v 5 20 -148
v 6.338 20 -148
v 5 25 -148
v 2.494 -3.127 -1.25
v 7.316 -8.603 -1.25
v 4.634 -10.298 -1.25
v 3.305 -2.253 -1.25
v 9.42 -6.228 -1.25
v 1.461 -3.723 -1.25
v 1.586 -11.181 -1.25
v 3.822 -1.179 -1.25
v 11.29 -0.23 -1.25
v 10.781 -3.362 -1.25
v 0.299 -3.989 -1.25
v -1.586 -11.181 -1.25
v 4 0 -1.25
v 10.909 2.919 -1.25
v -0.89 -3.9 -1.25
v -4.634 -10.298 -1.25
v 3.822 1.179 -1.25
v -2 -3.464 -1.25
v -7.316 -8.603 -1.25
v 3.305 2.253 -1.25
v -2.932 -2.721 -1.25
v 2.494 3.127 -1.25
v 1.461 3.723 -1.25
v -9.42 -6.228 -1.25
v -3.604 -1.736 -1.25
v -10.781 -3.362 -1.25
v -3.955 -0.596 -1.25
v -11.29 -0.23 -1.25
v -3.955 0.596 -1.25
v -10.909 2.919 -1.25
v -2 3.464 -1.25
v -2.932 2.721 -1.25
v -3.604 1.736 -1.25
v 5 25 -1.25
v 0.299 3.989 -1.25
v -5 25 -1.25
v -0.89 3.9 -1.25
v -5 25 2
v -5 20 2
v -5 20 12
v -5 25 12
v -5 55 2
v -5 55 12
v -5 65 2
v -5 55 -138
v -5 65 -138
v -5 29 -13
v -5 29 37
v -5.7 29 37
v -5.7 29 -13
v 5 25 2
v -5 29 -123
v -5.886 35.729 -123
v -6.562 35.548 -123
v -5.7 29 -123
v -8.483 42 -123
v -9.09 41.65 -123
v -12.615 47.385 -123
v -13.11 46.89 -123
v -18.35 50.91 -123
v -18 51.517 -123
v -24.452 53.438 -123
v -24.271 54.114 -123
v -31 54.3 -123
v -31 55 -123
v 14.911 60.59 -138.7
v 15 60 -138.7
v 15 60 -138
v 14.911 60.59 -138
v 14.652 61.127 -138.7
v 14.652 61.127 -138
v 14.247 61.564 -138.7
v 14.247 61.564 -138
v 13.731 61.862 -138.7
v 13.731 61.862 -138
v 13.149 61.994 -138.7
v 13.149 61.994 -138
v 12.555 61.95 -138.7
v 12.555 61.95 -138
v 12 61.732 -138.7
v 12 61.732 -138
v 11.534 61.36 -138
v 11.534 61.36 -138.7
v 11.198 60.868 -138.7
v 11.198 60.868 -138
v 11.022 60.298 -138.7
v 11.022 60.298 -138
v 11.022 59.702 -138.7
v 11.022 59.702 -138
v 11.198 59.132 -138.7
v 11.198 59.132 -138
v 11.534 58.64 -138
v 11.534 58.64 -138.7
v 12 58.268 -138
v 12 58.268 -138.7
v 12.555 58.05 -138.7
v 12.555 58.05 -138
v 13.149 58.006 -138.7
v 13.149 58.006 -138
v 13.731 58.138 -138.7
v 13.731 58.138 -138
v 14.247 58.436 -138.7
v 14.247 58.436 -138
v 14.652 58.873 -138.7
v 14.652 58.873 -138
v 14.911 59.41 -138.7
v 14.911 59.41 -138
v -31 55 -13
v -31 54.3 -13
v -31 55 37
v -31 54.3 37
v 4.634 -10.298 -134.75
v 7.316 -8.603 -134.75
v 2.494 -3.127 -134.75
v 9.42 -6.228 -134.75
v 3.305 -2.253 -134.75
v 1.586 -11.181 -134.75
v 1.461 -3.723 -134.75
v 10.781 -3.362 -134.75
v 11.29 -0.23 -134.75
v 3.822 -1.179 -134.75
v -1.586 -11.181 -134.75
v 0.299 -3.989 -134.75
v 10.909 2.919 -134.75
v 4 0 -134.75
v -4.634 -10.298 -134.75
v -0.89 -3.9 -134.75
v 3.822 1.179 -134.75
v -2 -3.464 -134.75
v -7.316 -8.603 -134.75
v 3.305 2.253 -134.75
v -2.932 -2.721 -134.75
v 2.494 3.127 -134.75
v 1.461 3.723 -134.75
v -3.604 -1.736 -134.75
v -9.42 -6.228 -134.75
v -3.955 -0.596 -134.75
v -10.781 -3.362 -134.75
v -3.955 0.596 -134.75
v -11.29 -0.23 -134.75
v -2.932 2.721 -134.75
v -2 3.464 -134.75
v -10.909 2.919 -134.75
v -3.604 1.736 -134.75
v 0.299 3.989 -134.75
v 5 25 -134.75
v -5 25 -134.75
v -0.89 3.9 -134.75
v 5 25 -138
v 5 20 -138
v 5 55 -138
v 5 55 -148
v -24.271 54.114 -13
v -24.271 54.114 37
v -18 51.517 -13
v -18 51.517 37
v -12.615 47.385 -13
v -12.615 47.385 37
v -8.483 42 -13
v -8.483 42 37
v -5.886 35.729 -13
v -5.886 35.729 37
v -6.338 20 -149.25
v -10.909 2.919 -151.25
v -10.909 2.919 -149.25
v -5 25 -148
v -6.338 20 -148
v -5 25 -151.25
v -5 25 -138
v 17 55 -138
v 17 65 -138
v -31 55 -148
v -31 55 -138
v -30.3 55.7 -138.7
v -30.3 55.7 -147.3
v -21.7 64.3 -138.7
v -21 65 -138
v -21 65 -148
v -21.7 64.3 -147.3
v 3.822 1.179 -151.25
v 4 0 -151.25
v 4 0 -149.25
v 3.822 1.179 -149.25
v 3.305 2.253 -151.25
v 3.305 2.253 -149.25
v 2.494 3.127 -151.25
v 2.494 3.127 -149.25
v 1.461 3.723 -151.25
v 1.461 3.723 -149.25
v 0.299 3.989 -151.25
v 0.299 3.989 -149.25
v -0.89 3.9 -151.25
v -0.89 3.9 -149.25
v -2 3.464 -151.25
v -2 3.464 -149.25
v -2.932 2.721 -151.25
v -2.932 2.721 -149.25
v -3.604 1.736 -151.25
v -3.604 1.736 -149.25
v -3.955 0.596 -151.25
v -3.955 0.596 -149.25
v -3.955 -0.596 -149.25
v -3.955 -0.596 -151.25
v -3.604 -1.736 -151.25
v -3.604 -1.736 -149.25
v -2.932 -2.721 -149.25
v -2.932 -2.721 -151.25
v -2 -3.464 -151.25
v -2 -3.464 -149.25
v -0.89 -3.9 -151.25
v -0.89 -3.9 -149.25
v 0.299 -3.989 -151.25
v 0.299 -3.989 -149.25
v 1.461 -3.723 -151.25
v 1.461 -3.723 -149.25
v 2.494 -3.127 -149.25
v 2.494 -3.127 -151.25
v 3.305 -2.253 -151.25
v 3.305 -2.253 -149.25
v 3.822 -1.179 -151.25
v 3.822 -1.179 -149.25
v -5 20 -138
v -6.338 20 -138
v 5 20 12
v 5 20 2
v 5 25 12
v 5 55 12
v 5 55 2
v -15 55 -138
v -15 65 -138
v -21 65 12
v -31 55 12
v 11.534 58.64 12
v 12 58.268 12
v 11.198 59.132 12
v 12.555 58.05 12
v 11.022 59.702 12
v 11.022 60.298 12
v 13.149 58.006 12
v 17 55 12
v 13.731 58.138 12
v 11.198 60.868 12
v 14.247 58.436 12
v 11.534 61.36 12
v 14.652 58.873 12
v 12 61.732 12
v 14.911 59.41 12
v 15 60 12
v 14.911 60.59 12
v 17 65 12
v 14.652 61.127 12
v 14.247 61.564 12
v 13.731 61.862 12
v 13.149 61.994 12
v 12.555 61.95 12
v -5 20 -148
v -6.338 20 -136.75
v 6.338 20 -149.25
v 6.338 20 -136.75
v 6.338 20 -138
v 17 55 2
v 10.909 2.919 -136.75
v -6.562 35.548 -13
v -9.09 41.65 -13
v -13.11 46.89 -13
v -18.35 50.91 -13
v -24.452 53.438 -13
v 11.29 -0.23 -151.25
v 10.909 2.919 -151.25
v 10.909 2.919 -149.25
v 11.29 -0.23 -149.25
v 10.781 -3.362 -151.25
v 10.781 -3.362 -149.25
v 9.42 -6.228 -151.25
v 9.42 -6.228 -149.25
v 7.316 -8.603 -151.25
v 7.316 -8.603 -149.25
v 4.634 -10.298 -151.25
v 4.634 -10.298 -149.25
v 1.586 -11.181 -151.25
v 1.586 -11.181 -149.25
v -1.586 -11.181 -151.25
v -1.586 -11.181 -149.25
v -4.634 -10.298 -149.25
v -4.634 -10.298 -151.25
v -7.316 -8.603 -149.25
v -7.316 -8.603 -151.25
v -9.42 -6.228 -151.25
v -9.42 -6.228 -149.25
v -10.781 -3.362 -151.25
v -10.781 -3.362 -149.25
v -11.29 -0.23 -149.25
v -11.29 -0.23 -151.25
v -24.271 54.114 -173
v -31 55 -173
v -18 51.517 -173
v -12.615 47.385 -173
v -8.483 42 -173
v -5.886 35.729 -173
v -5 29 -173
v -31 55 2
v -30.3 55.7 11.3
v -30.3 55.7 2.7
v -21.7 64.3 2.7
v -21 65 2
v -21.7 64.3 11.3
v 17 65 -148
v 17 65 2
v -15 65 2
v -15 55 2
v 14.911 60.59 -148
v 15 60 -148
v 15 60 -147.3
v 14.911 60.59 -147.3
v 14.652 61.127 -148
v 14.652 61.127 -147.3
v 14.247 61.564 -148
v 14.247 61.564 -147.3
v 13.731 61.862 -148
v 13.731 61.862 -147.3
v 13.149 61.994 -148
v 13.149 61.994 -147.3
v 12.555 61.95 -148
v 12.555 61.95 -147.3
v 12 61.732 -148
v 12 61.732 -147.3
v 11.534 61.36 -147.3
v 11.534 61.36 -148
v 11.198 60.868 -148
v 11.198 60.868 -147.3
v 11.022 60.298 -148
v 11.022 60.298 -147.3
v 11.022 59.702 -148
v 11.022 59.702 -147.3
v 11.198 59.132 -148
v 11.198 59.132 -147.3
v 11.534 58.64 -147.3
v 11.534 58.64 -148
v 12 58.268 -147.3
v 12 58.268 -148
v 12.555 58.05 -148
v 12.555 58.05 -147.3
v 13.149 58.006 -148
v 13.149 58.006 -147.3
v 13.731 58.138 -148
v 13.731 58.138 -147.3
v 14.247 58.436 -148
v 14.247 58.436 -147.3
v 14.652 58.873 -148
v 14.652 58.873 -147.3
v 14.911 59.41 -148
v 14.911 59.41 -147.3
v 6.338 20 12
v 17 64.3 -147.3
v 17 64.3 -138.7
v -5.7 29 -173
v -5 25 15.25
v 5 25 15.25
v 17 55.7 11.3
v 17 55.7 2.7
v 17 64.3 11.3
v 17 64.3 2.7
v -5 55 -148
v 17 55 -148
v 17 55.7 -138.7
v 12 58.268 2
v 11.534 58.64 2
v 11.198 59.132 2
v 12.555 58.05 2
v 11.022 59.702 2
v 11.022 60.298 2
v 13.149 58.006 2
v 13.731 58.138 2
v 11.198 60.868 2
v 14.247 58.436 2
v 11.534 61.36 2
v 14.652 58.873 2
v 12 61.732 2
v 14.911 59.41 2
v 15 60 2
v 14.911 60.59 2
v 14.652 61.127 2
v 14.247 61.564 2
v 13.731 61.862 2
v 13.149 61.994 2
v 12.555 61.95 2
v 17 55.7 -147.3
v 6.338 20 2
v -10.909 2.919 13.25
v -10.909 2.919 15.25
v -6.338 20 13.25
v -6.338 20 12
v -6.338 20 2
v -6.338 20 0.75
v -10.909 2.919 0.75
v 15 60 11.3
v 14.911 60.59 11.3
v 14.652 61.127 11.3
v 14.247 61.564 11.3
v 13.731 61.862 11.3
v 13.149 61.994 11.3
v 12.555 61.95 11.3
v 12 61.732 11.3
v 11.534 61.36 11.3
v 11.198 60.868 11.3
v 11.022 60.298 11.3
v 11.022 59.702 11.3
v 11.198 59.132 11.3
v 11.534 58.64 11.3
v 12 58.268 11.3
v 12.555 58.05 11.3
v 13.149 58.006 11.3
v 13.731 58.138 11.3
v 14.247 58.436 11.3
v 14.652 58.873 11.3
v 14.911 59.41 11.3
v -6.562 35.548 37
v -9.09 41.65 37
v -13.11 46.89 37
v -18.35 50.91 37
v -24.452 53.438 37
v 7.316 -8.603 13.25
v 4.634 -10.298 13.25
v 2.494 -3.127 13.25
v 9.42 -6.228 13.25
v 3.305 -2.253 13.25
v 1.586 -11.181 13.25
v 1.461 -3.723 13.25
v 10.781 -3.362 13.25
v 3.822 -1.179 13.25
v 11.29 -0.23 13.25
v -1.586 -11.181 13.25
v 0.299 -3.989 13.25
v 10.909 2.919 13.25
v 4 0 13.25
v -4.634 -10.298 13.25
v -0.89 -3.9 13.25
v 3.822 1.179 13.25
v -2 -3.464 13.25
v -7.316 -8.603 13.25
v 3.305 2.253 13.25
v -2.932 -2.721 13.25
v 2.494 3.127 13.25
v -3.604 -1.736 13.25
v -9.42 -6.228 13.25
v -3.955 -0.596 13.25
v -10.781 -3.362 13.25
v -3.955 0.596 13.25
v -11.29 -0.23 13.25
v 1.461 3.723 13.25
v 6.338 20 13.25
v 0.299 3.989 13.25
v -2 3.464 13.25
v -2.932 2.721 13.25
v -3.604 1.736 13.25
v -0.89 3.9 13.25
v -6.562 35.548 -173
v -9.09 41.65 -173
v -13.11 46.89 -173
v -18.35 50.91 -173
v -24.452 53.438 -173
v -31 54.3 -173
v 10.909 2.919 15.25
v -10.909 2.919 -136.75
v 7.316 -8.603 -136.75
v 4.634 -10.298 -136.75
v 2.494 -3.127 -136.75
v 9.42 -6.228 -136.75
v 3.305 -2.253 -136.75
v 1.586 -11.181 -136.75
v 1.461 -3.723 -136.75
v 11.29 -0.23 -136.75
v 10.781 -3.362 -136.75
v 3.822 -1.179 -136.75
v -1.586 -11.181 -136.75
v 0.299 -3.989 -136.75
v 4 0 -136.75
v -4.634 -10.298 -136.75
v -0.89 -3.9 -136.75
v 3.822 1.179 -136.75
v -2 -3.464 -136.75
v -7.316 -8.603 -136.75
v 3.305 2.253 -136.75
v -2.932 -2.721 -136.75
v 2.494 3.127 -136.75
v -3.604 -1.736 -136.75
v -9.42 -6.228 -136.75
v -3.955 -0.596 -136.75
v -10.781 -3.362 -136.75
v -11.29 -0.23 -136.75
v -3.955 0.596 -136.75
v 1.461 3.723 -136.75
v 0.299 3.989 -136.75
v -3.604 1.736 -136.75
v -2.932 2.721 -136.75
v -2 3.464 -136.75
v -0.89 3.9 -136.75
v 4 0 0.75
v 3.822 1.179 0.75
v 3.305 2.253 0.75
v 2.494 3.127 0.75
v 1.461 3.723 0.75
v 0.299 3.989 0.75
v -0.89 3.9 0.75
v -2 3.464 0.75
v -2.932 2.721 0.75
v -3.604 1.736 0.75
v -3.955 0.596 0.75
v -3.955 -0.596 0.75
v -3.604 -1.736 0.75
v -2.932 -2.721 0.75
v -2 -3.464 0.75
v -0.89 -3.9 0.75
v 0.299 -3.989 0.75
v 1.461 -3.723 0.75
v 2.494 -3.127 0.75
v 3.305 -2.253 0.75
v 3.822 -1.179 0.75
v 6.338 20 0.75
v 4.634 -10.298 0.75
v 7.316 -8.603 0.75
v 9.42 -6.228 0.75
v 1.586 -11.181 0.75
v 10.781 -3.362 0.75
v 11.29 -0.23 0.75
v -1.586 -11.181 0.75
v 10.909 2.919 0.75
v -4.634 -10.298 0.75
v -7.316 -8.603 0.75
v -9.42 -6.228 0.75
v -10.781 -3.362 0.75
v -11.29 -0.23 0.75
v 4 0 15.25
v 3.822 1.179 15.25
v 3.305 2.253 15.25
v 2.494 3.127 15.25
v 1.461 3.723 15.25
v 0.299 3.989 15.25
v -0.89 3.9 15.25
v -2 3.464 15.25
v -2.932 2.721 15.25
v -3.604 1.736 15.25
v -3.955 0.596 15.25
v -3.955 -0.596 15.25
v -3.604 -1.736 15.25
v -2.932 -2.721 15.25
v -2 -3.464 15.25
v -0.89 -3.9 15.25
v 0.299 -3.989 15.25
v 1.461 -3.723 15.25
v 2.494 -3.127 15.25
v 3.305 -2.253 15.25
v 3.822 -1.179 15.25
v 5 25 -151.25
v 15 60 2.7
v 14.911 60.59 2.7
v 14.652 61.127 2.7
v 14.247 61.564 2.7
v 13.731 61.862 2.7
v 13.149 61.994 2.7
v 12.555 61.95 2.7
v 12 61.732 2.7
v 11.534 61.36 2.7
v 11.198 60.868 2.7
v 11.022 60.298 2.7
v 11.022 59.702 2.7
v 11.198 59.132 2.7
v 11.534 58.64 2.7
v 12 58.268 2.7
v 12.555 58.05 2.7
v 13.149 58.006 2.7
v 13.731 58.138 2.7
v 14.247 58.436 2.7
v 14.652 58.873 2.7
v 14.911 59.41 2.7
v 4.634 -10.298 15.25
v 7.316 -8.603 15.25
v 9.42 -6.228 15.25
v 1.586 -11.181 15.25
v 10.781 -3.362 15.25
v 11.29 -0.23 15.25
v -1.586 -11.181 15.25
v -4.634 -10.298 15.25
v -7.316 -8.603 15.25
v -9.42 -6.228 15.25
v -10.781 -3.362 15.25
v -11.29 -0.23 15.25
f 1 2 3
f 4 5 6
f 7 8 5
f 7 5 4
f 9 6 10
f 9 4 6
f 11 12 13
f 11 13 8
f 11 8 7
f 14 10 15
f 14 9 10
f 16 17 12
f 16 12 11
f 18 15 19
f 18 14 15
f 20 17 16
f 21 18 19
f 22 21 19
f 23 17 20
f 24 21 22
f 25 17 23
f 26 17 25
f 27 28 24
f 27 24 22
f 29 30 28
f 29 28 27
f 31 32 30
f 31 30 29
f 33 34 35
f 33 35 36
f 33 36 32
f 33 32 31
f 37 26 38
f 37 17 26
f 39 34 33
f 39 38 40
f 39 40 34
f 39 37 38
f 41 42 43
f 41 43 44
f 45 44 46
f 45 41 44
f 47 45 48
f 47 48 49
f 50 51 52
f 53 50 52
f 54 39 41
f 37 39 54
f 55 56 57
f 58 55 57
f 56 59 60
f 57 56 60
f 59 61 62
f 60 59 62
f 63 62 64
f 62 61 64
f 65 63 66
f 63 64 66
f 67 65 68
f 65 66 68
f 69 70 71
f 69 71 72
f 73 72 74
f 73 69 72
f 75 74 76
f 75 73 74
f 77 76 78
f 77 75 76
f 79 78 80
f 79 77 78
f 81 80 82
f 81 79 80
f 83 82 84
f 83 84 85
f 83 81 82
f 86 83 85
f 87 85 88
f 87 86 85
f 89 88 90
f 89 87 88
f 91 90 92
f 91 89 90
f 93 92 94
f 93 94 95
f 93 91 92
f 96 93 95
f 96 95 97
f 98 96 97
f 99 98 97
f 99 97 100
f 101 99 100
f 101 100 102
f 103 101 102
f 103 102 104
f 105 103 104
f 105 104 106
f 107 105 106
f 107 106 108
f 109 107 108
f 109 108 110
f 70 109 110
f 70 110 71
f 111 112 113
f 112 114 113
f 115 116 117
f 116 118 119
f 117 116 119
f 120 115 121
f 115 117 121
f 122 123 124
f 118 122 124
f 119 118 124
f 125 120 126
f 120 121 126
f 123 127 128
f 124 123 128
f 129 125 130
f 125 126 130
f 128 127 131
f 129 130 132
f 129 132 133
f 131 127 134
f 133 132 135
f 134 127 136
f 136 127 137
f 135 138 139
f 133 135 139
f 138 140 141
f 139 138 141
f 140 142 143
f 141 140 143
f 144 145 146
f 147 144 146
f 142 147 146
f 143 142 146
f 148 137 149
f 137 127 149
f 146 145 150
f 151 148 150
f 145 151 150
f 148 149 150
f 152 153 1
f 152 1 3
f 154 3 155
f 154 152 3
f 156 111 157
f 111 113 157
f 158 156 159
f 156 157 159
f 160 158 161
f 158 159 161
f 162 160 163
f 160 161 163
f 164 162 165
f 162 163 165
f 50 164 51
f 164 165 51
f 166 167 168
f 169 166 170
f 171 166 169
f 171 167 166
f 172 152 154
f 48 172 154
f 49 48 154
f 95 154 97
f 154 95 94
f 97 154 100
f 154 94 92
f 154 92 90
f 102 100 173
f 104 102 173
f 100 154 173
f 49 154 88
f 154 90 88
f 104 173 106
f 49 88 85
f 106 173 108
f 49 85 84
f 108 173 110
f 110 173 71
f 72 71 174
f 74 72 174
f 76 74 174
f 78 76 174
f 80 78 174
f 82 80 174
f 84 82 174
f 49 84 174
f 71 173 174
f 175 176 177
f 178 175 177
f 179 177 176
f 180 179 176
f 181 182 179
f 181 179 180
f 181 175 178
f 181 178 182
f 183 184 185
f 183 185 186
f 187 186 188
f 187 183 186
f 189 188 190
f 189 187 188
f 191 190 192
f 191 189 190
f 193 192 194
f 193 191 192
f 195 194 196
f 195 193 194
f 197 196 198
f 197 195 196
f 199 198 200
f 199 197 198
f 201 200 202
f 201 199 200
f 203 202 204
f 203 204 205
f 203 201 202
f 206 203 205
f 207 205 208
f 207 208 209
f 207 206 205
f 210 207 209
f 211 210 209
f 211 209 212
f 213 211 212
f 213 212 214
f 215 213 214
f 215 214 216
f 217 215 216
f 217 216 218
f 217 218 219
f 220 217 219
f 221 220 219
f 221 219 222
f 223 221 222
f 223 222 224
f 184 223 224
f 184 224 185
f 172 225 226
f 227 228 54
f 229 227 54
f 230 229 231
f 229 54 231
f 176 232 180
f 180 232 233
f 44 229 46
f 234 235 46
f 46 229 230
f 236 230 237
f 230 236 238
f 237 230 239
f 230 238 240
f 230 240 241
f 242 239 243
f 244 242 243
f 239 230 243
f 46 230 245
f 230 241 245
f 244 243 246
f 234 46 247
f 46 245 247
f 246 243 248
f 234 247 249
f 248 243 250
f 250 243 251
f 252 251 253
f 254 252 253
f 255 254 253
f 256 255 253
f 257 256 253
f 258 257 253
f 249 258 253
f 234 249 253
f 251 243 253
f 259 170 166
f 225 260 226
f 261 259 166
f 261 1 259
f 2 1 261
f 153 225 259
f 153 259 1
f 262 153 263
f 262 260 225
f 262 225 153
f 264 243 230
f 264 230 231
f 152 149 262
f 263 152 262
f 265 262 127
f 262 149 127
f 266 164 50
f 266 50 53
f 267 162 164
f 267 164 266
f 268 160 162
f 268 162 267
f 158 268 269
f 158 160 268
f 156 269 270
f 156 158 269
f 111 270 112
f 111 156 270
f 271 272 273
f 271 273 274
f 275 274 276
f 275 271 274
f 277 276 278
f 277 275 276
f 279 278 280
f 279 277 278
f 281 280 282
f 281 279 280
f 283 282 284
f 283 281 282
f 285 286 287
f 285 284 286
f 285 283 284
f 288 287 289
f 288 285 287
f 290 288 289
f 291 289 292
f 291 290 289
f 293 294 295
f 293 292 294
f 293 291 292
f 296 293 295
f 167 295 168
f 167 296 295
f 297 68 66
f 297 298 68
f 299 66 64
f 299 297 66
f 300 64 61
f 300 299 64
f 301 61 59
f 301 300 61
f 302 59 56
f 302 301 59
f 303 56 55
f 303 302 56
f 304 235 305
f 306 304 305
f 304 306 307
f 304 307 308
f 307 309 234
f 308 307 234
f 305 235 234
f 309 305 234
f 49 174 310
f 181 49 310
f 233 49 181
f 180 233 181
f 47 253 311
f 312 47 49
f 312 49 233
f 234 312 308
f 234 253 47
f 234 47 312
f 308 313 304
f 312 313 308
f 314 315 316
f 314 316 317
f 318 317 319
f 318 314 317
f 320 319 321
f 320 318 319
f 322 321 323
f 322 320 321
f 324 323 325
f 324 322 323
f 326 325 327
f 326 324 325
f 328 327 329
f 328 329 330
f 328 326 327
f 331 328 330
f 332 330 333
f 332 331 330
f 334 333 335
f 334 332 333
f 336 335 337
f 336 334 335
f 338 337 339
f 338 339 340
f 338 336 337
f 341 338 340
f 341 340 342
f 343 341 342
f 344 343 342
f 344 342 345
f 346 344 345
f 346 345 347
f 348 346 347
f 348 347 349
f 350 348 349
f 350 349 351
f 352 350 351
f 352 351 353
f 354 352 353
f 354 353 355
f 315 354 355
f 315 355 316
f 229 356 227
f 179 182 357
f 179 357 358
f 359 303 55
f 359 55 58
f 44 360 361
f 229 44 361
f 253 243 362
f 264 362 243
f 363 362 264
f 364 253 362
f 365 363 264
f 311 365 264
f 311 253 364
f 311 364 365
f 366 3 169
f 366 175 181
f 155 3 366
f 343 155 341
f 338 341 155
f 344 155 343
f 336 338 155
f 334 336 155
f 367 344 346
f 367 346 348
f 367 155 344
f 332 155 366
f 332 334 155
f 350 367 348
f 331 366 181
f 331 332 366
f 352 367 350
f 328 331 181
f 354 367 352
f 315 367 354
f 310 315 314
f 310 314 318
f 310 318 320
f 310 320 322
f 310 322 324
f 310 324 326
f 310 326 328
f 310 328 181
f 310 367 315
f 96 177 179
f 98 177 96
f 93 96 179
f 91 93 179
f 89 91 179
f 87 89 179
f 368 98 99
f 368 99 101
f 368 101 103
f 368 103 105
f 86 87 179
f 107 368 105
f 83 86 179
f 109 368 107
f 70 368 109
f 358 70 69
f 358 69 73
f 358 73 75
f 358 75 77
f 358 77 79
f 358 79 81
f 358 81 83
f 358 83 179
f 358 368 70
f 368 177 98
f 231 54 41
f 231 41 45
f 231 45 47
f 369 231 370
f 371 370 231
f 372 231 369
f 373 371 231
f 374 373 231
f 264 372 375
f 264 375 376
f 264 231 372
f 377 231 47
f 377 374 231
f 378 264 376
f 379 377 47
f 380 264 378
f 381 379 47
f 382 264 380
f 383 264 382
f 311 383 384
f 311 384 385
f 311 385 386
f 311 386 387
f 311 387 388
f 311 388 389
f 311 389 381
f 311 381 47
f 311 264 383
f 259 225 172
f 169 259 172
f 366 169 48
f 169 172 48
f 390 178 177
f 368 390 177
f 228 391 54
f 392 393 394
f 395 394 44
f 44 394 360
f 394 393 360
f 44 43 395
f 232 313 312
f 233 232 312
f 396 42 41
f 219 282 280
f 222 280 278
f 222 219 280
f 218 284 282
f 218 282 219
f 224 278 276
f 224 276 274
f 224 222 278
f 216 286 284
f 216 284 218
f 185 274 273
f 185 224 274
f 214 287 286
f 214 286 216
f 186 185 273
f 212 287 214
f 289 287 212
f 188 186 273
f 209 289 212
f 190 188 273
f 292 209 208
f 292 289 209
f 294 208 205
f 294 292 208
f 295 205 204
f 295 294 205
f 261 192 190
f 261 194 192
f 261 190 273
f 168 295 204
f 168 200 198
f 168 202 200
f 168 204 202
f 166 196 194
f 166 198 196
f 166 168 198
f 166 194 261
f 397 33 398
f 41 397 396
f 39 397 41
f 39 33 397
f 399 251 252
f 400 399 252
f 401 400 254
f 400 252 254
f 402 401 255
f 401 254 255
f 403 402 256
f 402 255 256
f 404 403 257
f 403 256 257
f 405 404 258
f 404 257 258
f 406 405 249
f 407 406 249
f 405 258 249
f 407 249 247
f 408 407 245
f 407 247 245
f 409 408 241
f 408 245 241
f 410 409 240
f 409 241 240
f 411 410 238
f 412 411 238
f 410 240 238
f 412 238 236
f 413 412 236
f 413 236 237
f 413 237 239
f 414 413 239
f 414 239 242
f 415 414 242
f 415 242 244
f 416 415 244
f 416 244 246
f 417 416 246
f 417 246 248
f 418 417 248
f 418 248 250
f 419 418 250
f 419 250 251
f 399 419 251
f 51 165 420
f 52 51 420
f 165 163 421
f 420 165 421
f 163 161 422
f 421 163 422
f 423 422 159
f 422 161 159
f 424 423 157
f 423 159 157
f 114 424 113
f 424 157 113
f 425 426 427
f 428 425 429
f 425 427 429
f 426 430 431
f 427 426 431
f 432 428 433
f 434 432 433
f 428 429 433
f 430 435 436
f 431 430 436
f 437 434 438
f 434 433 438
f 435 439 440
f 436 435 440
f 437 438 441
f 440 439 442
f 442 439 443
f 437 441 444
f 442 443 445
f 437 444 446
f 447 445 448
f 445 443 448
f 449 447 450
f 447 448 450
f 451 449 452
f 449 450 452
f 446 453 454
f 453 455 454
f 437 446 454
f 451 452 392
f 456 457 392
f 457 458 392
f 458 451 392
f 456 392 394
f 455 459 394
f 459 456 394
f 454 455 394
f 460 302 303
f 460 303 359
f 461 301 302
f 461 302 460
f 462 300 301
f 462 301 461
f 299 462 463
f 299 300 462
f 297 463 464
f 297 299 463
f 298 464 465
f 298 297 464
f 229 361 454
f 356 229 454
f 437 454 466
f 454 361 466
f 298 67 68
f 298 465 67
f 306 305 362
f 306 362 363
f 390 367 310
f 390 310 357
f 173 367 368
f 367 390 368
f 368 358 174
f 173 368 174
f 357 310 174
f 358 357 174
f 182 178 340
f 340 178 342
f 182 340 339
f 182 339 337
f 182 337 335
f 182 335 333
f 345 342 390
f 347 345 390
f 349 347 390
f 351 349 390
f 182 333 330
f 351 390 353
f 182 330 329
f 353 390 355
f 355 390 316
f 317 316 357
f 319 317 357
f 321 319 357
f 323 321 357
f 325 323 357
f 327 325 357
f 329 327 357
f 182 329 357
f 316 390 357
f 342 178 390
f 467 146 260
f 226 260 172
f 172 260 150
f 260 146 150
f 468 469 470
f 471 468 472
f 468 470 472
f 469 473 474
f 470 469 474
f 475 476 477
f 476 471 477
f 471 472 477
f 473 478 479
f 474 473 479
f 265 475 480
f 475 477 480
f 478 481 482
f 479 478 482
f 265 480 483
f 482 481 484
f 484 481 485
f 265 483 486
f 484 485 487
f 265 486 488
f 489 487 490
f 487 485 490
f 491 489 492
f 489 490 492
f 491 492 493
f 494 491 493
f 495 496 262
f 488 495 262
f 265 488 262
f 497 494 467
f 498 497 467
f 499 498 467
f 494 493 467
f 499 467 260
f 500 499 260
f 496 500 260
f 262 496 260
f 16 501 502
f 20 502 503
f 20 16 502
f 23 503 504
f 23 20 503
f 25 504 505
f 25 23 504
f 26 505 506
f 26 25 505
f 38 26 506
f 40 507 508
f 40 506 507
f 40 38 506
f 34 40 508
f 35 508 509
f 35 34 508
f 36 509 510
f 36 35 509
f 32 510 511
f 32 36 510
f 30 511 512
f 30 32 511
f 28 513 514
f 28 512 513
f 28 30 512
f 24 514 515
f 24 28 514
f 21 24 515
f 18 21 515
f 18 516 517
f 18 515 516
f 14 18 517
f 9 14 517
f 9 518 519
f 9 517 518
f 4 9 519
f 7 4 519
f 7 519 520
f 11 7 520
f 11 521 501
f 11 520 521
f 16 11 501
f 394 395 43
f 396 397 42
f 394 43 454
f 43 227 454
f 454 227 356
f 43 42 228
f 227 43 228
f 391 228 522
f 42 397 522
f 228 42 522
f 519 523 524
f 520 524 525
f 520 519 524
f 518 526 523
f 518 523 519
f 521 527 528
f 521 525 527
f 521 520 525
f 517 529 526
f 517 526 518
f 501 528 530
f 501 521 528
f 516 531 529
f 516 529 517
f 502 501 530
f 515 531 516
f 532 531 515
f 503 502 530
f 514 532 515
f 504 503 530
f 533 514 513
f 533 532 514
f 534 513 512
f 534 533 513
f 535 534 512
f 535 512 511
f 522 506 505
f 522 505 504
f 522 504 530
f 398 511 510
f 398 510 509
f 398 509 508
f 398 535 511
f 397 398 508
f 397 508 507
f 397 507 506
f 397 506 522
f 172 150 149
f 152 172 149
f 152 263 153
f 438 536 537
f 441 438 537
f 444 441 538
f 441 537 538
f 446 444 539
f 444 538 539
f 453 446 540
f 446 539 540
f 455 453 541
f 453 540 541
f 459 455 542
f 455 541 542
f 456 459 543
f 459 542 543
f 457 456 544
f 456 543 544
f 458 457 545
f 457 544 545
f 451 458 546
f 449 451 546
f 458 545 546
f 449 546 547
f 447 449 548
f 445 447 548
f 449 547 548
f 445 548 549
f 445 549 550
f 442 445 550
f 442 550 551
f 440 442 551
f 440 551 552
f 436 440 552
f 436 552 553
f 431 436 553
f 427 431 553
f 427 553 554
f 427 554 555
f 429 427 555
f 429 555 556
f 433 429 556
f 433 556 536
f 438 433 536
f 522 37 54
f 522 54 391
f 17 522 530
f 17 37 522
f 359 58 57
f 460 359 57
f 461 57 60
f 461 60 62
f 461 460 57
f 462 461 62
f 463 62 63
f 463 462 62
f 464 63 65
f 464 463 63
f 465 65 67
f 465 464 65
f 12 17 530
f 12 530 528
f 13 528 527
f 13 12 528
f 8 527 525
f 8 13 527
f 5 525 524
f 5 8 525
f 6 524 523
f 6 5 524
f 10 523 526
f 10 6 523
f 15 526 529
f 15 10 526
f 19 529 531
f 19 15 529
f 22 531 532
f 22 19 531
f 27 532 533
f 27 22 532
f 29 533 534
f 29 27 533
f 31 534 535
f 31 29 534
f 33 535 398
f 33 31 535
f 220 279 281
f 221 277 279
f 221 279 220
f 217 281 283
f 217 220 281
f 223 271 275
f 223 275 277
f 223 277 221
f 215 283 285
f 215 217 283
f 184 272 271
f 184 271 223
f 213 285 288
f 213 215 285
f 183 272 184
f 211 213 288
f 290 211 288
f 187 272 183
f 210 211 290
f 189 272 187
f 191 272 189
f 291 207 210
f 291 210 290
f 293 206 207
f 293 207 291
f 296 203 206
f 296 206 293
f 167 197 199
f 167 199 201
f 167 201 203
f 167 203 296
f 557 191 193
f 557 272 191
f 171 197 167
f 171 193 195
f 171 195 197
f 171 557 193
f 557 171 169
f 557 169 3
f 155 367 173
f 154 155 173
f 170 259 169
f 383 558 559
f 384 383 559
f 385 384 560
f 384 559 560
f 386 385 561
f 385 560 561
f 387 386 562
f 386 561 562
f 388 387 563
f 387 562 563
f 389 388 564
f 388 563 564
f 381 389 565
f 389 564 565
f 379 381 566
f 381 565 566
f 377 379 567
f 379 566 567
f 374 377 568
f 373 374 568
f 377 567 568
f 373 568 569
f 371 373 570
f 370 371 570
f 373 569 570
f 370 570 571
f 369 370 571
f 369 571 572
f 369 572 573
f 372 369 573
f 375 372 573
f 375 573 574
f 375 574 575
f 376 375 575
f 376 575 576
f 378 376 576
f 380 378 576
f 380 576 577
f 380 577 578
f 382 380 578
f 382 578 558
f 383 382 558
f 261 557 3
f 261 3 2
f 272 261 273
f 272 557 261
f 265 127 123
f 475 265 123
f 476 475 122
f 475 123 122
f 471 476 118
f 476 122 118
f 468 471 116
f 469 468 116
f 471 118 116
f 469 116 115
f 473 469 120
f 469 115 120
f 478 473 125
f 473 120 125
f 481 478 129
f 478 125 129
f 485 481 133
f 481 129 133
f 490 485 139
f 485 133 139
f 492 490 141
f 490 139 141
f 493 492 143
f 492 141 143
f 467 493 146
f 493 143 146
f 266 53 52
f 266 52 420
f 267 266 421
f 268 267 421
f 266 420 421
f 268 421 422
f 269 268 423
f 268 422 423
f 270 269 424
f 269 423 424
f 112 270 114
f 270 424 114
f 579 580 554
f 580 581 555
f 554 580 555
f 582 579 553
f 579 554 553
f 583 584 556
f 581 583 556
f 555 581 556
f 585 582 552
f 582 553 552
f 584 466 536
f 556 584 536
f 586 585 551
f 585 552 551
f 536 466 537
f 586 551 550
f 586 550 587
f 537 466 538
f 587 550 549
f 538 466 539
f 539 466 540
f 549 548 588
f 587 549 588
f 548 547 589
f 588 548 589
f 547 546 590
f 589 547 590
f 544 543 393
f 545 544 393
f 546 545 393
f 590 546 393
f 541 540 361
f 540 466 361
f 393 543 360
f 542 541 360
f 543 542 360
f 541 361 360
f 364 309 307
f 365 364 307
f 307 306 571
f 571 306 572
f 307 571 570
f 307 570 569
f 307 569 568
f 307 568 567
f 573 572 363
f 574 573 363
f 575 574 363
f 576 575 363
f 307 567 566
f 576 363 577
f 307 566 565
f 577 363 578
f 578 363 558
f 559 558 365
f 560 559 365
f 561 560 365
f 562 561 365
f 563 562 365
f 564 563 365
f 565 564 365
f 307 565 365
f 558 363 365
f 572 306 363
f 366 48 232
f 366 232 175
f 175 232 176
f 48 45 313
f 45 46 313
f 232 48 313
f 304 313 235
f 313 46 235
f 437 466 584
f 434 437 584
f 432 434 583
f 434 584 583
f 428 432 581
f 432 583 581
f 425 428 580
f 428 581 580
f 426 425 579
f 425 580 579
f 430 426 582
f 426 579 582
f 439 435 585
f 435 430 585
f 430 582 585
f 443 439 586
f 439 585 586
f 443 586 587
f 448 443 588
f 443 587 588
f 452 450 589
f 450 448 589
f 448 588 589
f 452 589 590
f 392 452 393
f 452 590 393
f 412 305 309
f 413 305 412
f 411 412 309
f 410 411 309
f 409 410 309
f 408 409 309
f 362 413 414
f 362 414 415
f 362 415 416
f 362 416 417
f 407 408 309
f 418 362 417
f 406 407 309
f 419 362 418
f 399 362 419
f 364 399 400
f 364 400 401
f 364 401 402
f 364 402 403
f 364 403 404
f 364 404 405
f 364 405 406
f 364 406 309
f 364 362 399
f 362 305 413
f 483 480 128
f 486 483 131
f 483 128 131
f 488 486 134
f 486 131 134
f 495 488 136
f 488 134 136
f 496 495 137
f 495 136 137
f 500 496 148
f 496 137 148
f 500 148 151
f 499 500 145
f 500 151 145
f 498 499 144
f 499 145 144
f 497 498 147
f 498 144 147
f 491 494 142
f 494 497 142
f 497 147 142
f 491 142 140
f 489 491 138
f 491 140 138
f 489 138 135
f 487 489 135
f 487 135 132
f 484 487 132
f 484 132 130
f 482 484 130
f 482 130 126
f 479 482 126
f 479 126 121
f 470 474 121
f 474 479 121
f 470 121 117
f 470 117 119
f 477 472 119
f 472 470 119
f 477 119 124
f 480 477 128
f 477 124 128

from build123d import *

# Parameters (mm, degrees)
BOSS_EXTRUDE1_DEPTH      = 2
BOSS_EXTRUDE1_DEPTH_BACK = 1.25
SKETCH1_R                = 4
SKETCH2_W                = 10
SKETCH2_H                = 35
BOSS_EXTRUDE2_DEPTH      = 10
SKETCH4_W                = 10
SKETCH4_H                = 10
SKETCH4_W_2              = 8.6
SKETCH4_H_2              = 8.6
BOSS_EXTRUDE3_DEPTH      = 48
SKETCH5_R                = 2
CUT_EXTRUDE1_DEPTH       = 50
BOSS_EXTRUDE4_DEPTH      = 25
CUT_EXTRUDE2_DEPTH       = 50
CUT_EXTRUDE3_DEPTH       = 31
CUT_EXTRUDE3_DEPTH_BACK  = 26
SKETCH14_W               = 1.25
SKETCH14_H               = 34.903307858
SKETCH14_H_2             = 36.088768165
SKETCH15_W               = 10
SKETCH15_H               = 10
BOSS_EXTRUDE7_DEPTH      = 140


with BuildPart() as part:
    # Sketch1 → Boss-Extrude1 (new, two sides: drawn at the far end of the back side and taken through both)
    with BuildSketch(Plane.XY.offset(-BOSS_EXTRUDE1_DEPTH_BACK)):
        with BuildLine():
            Line((-5, 25), (5, 25))
            Line((5, 25), (10.908860009, 2.919234199))
            ThreePointArc((10.908860009, 2.919234199), (0, -11.292703618), (-10.908860009, 2.919234199))
            Line((-10.908860009, 2.919234199), (-5, 25))
        make_face()
        Circle(SKETCH1_R, mode=Mode.SUBTRACT)
    extrude(amount=BOSS_EXTRUDE1_DEPTH + BOSS_EXTRUDE1_DEPTH_BACK)

    # Sketch2 → Boss-Extrude2 (add)
    with BuildSketch(Plane.XY.offset(2)):
        with Locations((0, 37.5)):
            Rectangle(SKETCH2_W, SKETCH2_H)
    extrude(amount=BOSS_EXTRUDE2_DEPTH)

    # Mirror1: part across plane


with BuildPart() as part_1:
    add(part.part)
    add(part.part.mirror(Plane.XY.offset(7)))

    # Sketch4 → Boss-Extrude3 (add)
    with BuildSketch(Plane(origin=(17, 0, 0), x_dir=(0, 0, -1), z_dir=(1, 0, 0))):
        with Locations((-7, 60)):
            Rectangle(SKETCH4_W, SKETCH4_H)
        with Locations((-7, 60)):
            Rectangle(SKETCH4_W_2, SKETCH4_H_2, mode=Mode.SUBTRACT)
    extrude(amount=-BOSS_EXTRUDE3_DEPTH)

    # Sketch5 → Cut-Extrude1 (cut)
    with BuildSketch(Plane.XY.offset(12)):
        with Locations((13, 60)):
            Circle(SKETCH5_R)
    extrude(amount=-CUT_EXTRUDE1_DEPTH, mode=Mode.SUBTRACT)

    # Sketch10 → Cut-Extrude2 (cut)
    with BuildSketch(Plane.XY.offset(12)):
        Polygon((-31, 65), (-31, 55), (-21, 65), align=None)
    extrude(amount=-CUT_EXTRUDE2_DEPTH, mode=Mode.SUBTRACT)

    # Sketch14 → Cut-Extrude3 (cut, two sides: drawn at the far end of the back side and taken through both)
    with BuildSketch(Plane(origin=(5, 0, 0), x_dir=(0, 0, -1), z_dir=(1, 0, 0)).offset(-CUT_EXTRUDE3_DEPTH_BACK)):
        with Locations((-1.375, 2.548346071)):
            Rectangle(SKETCH14_W, SKETCH14_H)
        with Locations((-12.625, 1.955615917)):
            Rectangle(SKETCH14_W, SKETCH14_H_2)
    extrude(amount=CUT_EXTRUDE3_DEPTH + CUT_EXTRUDE3_DEPTH_BACK, mode=Mode.SUBTRACT)


with BuildPart() as body_2:
    # Sketch9 → Boss-Extrude4 (new, symmetric)
    with BuildSketch(Plane.XY.offset(12)):
        with BuildLine():
            ThreePointArc((-5.7, 29), (-13.110198436, 46.889801564), (-31, 54.3))
            Line((-31, 54.3), (-31, 55))
            ThreePointArc((-31, 55), (-12.615223689, 47.384776311), (-5, 29))
            Line((-5, 29), (-5.7, 29))
        make_face()
    extrude(amount=BOSS_EXTRUDE4_DEPTH, both=True)


with BuildPart() as body_3:
    # Mirror2: mirrored copy
    add(part_1.part.mirror(Plane(origin=(0, 0, -68), x_dir=(1, 0, 0), z_dir=(0, 0, -1))))


with BuildPart() as body_4:
    # Mirror2 2: mirrored copy
    add(body_2.part.mirror(Plane(origin=(0, 0, -68), x_dir=(1, 0, 0), z_dir=(0, 0, -1))))


with BuildPart() as part_2:
    add(part_1.part)

    add(body_3.part)  # Boss-Extrude7 merges body 3
    # Sketch15 → Boss-Extrude7 (add)
    with BuildSketch(Plane(origin=(0, 0, 2), x_dir=(-1, 0, 0), z_dir=(0, 0, -1))):
        with Locations((10, 60)):
            Rectangle(SKETCH15_W, SKETCH15_H)
    extrude(amount=BOSS_EXTRUDE7_DEPTH)


solid = Compound([body_2.part, body_4.part, part_2.part])
